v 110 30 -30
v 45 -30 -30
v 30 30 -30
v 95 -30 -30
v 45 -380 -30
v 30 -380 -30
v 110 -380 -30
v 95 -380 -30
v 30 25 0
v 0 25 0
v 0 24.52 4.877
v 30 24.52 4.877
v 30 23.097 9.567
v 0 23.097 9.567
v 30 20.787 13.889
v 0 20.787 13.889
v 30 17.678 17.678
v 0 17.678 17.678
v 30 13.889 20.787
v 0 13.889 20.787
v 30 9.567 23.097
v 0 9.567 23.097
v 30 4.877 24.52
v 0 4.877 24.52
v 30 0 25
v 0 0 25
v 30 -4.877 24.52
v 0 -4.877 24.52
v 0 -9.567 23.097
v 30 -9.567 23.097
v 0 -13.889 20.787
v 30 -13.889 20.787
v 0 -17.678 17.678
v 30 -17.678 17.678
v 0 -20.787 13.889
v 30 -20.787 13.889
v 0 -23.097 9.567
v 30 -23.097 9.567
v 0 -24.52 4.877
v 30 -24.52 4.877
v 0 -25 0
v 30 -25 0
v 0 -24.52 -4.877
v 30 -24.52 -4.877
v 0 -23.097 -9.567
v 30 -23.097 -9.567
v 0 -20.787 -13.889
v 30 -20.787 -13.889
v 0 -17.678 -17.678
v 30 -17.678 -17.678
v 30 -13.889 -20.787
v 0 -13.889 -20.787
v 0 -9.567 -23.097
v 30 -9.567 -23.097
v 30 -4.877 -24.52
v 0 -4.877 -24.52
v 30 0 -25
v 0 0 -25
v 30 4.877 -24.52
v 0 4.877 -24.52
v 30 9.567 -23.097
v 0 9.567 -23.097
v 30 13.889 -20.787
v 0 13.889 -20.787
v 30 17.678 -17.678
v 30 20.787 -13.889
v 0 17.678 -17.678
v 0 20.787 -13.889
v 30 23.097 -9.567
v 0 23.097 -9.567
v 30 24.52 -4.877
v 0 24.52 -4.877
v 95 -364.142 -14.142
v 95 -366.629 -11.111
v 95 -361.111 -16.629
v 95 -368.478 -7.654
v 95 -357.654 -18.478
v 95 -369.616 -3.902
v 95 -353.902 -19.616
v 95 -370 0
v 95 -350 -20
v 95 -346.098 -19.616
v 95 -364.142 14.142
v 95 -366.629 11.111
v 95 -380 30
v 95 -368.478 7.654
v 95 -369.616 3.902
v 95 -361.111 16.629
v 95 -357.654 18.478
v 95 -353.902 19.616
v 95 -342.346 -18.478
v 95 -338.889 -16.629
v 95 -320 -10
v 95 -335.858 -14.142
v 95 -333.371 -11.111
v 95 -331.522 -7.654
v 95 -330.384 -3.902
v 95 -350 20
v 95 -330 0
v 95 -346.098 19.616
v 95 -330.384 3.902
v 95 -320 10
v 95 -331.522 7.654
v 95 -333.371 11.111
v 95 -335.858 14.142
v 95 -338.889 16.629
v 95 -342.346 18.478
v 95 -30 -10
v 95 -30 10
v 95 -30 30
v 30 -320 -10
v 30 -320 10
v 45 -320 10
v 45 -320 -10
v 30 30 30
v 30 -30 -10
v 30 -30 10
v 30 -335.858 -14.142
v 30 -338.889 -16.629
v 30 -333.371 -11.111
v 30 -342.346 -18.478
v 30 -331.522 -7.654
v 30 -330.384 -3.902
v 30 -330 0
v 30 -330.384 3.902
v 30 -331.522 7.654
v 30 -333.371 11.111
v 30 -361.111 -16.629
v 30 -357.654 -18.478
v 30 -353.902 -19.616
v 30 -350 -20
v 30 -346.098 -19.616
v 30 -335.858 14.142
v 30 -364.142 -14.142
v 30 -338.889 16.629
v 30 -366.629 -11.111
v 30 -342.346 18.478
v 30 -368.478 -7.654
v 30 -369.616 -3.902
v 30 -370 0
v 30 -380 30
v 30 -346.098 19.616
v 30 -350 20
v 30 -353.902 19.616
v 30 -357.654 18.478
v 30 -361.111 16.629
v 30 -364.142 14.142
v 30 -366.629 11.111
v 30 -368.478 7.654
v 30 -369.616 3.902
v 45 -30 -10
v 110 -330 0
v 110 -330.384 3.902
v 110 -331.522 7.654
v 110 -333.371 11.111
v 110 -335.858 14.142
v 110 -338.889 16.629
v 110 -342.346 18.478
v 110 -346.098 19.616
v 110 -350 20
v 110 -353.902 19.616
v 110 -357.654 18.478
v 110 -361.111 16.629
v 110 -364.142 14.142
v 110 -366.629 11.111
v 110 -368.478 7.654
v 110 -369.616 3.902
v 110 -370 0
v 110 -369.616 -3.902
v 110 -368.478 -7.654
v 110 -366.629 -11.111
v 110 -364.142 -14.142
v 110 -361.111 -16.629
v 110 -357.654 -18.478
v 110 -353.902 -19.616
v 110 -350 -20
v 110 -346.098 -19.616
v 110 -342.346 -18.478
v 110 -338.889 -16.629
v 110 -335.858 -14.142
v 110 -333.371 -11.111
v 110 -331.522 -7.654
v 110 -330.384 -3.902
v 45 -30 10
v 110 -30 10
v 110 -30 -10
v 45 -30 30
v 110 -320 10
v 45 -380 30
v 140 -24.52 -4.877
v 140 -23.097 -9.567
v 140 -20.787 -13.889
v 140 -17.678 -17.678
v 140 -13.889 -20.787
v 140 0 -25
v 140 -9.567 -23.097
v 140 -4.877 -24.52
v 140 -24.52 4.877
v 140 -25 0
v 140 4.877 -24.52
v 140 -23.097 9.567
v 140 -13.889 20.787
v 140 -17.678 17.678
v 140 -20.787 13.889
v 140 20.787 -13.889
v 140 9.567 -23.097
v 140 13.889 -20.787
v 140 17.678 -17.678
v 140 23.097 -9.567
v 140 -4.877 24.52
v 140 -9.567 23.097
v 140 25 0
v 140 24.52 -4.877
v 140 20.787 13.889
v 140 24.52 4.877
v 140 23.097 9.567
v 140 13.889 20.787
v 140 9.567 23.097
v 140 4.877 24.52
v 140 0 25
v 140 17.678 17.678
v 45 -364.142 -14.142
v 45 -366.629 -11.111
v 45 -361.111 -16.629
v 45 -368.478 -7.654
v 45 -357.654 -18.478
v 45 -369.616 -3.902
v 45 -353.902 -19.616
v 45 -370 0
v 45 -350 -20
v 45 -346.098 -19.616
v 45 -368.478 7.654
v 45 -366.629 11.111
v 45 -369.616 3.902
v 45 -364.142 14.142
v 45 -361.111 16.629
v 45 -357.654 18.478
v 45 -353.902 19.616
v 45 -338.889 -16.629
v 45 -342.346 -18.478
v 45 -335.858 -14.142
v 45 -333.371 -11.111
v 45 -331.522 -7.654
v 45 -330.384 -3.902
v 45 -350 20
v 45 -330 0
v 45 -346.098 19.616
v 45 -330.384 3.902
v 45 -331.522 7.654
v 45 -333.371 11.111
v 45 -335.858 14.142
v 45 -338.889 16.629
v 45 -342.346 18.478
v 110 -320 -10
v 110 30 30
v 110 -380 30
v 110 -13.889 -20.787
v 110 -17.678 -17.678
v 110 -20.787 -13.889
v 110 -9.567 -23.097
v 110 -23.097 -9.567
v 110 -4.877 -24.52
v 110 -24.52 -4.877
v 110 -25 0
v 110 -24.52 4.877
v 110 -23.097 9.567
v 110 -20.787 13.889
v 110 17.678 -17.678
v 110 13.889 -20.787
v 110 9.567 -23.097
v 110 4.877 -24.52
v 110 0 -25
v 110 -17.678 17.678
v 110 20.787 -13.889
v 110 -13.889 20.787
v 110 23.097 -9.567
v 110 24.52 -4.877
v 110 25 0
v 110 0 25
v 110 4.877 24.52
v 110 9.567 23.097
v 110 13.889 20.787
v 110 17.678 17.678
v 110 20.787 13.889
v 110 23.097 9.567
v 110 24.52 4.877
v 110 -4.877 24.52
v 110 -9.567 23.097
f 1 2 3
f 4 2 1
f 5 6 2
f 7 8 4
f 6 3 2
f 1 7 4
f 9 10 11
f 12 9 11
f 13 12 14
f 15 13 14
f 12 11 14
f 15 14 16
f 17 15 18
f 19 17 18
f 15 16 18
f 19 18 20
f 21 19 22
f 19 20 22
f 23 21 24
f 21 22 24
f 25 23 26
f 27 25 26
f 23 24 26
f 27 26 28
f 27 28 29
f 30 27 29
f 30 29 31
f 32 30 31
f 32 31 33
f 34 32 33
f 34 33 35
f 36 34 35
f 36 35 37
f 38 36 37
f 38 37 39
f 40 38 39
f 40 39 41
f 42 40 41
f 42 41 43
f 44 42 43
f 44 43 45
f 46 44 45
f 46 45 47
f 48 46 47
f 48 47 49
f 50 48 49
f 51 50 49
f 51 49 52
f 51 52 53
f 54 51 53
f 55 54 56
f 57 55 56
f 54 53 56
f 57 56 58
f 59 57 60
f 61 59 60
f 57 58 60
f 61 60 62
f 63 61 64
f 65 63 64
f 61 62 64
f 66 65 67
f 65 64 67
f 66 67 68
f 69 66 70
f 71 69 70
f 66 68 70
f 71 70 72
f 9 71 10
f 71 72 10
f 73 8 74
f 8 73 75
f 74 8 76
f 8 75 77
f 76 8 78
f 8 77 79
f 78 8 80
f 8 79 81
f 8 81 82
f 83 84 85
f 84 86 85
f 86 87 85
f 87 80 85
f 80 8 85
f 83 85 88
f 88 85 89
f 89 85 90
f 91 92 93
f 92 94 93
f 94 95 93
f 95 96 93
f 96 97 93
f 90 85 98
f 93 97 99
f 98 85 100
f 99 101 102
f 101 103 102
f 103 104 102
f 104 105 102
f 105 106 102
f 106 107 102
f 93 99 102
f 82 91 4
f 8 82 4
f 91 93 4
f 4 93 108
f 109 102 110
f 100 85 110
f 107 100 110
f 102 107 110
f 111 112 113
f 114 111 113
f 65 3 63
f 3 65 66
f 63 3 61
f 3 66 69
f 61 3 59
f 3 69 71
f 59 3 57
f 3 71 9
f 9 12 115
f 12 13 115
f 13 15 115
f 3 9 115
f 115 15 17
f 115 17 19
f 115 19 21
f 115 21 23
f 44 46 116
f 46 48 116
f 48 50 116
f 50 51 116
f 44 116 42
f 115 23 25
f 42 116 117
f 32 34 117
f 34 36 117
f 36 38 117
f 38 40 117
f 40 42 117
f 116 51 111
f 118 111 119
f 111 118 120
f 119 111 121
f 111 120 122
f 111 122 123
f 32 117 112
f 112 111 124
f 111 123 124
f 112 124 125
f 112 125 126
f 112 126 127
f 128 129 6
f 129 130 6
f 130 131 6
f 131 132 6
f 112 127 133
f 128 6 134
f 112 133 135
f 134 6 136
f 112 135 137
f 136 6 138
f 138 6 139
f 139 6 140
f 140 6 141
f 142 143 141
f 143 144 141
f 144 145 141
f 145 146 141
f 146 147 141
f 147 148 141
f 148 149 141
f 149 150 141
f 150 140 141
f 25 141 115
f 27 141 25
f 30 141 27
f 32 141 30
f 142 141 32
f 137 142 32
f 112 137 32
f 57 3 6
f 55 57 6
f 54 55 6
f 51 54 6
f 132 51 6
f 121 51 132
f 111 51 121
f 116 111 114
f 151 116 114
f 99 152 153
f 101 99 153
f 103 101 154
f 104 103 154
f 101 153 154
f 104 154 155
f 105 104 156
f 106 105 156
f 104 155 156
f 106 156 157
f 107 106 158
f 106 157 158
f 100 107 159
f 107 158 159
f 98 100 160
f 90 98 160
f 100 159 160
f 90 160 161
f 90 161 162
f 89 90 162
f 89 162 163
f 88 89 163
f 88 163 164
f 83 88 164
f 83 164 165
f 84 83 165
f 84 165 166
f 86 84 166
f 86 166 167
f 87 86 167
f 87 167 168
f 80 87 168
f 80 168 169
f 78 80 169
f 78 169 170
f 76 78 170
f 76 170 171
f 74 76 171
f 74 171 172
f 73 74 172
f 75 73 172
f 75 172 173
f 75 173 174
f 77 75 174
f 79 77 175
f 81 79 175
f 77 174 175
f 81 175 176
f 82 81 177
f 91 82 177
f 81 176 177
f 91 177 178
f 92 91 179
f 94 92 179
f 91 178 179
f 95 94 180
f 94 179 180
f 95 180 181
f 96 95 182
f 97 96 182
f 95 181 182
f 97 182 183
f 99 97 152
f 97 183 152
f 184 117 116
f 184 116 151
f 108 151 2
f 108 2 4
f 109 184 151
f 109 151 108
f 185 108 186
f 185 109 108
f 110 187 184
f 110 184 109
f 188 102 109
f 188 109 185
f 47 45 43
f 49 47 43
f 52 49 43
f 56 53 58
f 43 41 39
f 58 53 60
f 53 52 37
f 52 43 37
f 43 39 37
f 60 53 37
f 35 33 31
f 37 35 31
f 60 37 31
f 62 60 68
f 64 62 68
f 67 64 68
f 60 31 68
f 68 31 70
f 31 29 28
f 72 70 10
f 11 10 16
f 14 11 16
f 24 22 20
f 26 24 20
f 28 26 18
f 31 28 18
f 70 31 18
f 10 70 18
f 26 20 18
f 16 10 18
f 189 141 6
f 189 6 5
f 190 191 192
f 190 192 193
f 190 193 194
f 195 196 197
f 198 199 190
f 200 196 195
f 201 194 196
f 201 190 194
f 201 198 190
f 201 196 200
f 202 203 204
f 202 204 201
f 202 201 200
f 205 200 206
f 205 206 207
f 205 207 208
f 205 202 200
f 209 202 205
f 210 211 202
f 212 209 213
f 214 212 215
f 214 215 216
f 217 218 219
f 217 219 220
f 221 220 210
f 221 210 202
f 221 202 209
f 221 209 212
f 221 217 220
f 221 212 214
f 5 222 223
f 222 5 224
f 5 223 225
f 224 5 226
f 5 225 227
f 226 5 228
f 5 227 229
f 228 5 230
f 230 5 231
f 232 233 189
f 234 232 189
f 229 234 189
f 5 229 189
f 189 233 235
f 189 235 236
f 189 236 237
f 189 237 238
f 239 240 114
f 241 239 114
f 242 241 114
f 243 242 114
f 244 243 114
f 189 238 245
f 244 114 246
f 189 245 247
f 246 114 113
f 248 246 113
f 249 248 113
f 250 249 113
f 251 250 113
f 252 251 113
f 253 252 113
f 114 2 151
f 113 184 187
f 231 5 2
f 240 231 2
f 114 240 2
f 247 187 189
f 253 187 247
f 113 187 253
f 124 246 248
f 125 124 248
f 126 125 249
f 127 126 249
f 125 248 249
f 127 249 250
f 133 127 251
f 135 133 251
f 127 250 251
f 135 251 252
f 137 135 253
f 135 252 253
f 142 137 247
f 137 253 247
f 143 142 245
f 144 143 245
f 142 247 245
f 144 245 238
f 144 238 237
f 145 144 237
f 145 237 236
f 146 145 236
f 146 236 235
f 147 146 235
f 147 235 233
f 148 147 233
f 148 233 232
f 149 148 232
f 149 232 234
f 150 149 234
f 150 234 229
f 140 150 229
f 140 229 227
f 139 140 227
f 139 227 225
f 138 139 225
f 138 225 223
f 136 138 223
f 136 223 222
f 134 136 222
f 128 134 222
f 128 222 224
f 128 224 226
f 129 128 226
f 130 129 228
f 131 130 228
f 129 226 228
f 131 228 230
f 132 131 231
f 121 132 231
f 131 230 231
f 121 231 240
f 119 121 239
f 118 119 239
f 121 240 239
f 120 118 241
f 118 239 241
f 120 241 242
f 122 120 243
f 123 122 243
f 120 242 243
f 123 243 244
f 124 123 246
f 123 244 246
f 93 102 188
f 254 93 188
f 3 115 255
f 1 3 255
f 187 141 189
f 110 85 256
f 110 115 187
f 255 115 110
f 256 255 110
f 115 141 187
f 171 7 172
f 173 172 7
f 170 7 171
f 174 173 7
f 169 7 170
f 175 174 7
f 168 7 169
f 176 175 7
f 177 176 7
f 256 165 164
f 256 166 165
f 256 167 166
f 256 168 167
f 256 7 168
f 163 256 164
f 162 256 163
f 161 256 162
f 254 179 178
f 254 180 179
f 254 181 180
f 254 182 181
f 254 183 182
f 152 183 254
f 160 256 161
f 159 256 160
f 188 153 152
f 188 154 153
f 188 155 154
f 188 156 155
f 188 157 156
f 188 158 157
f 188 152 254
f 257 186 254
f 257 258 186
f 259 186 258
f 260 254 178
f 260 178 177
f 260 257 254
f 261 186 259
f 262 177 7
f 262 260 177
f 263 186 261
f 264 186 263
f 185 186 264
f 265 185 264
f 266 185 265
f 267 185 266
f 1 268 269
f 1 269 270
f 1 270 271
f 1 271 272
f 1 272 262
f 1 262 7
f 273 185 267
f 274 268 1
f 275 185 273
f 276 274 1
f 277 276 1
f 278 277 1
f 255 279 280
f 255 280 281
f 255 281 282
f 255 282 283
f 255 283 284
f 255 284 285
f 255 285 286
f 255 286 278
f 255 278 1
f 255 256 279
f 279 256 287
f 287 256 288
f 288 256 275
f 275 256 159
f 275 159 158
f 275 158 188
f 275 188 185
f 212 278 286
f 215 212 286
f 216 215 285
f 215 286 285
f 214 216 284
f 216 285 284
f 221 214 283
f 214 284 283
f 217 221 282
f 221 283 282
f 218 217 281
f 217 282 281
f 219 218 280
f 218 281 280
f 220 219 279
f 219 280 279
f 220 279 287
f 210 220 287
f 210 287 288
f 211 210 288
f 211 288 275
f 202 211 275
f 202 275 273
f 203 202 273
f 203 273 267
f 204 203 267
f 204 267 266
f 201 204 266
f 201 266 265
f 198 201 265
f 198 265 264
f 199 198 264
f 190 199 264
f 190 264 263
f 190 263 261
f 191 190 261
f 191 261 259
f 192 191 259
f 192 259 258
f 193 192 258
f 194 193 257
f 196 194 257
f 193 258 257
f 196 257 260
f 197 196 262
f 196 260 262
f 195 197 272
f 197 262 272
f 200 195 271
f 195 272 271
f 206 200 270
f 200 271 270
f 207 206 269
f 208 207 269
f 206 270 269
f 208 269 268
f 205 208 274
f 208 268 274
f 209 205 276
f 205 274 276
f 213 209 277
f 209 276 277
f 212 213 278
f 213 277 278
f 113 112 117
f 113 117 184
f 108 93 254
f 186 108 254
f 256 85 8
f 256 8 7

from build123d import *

# Parameters (mm, degrees)
F0_R          = 25
F1_DEPTH      = 140
F2_W          = 80
F2_H          = 60
F3_DEPTH      = 30
F3_DEPTH_BACK = 30
F4_W          = 15
F4_H          = 20
F5_DEPTH      = 350
F6_W          = 15
F6_H          = 60
F7_DEPTH      = 50
F8_R          = 20
F9_DEPTH      = 110.001


with BuildPart() as f1:
    # F0 (on Right) → F1 (new body)
    with BuildSketch(Plane.YZ):
        Circle(F0_R)
    extrude(amount=F1_DEPTH)

    # F2 (on Front) → F3 (join, two sides)
    with BuildSketch(Plane.XZ) as f3_sk:
        with Locations((70, 0)):
            Rectangle(F2_W, F2_H)
    extrude(amount=F3_DEPTH)
    extrude(f3_sk.sketch, amount=-F3_DEPTH_BACK)

    # F4 (on face) → F5 (join)
    with BuildSketch(Plane.XZ.offset(30)):
        with Locations((102.5, 20)):
            Rectangle(F4_W, F4_H)
        with Locations((37.5, 20)):
            Rectangle(F4_W, F4_H)
        with Locations((37.5, -20)):
            Rectangle(F4_W, F4_H)
        with Locations((102.5, -20)):
            Rectangle(F4_W, F4_H)
    extrude(amount=F5_DEPTH)

    # F6 (on face) → F7 (join)
    with BuildSketch(Plane.XY.offset(30)):
        with Locations((102.5, -350)):
            Rectangle(F6_W, F6_H)
        with Locations((37.5, -350)):
            Rectangle(F6_W, F6_H)
    extrude(amount=-F7_DEPTH)

    # F8 (on face) → F9 (cut, through all)
    with BuildSketch(Plane.YZ.offset(110)):
        with Locations((-350, 0)):
            Circle(F8_R)
    extrude(amount=-F9_DEPTH, mode=Mode.SUBTRACT)


solid = f1.part
